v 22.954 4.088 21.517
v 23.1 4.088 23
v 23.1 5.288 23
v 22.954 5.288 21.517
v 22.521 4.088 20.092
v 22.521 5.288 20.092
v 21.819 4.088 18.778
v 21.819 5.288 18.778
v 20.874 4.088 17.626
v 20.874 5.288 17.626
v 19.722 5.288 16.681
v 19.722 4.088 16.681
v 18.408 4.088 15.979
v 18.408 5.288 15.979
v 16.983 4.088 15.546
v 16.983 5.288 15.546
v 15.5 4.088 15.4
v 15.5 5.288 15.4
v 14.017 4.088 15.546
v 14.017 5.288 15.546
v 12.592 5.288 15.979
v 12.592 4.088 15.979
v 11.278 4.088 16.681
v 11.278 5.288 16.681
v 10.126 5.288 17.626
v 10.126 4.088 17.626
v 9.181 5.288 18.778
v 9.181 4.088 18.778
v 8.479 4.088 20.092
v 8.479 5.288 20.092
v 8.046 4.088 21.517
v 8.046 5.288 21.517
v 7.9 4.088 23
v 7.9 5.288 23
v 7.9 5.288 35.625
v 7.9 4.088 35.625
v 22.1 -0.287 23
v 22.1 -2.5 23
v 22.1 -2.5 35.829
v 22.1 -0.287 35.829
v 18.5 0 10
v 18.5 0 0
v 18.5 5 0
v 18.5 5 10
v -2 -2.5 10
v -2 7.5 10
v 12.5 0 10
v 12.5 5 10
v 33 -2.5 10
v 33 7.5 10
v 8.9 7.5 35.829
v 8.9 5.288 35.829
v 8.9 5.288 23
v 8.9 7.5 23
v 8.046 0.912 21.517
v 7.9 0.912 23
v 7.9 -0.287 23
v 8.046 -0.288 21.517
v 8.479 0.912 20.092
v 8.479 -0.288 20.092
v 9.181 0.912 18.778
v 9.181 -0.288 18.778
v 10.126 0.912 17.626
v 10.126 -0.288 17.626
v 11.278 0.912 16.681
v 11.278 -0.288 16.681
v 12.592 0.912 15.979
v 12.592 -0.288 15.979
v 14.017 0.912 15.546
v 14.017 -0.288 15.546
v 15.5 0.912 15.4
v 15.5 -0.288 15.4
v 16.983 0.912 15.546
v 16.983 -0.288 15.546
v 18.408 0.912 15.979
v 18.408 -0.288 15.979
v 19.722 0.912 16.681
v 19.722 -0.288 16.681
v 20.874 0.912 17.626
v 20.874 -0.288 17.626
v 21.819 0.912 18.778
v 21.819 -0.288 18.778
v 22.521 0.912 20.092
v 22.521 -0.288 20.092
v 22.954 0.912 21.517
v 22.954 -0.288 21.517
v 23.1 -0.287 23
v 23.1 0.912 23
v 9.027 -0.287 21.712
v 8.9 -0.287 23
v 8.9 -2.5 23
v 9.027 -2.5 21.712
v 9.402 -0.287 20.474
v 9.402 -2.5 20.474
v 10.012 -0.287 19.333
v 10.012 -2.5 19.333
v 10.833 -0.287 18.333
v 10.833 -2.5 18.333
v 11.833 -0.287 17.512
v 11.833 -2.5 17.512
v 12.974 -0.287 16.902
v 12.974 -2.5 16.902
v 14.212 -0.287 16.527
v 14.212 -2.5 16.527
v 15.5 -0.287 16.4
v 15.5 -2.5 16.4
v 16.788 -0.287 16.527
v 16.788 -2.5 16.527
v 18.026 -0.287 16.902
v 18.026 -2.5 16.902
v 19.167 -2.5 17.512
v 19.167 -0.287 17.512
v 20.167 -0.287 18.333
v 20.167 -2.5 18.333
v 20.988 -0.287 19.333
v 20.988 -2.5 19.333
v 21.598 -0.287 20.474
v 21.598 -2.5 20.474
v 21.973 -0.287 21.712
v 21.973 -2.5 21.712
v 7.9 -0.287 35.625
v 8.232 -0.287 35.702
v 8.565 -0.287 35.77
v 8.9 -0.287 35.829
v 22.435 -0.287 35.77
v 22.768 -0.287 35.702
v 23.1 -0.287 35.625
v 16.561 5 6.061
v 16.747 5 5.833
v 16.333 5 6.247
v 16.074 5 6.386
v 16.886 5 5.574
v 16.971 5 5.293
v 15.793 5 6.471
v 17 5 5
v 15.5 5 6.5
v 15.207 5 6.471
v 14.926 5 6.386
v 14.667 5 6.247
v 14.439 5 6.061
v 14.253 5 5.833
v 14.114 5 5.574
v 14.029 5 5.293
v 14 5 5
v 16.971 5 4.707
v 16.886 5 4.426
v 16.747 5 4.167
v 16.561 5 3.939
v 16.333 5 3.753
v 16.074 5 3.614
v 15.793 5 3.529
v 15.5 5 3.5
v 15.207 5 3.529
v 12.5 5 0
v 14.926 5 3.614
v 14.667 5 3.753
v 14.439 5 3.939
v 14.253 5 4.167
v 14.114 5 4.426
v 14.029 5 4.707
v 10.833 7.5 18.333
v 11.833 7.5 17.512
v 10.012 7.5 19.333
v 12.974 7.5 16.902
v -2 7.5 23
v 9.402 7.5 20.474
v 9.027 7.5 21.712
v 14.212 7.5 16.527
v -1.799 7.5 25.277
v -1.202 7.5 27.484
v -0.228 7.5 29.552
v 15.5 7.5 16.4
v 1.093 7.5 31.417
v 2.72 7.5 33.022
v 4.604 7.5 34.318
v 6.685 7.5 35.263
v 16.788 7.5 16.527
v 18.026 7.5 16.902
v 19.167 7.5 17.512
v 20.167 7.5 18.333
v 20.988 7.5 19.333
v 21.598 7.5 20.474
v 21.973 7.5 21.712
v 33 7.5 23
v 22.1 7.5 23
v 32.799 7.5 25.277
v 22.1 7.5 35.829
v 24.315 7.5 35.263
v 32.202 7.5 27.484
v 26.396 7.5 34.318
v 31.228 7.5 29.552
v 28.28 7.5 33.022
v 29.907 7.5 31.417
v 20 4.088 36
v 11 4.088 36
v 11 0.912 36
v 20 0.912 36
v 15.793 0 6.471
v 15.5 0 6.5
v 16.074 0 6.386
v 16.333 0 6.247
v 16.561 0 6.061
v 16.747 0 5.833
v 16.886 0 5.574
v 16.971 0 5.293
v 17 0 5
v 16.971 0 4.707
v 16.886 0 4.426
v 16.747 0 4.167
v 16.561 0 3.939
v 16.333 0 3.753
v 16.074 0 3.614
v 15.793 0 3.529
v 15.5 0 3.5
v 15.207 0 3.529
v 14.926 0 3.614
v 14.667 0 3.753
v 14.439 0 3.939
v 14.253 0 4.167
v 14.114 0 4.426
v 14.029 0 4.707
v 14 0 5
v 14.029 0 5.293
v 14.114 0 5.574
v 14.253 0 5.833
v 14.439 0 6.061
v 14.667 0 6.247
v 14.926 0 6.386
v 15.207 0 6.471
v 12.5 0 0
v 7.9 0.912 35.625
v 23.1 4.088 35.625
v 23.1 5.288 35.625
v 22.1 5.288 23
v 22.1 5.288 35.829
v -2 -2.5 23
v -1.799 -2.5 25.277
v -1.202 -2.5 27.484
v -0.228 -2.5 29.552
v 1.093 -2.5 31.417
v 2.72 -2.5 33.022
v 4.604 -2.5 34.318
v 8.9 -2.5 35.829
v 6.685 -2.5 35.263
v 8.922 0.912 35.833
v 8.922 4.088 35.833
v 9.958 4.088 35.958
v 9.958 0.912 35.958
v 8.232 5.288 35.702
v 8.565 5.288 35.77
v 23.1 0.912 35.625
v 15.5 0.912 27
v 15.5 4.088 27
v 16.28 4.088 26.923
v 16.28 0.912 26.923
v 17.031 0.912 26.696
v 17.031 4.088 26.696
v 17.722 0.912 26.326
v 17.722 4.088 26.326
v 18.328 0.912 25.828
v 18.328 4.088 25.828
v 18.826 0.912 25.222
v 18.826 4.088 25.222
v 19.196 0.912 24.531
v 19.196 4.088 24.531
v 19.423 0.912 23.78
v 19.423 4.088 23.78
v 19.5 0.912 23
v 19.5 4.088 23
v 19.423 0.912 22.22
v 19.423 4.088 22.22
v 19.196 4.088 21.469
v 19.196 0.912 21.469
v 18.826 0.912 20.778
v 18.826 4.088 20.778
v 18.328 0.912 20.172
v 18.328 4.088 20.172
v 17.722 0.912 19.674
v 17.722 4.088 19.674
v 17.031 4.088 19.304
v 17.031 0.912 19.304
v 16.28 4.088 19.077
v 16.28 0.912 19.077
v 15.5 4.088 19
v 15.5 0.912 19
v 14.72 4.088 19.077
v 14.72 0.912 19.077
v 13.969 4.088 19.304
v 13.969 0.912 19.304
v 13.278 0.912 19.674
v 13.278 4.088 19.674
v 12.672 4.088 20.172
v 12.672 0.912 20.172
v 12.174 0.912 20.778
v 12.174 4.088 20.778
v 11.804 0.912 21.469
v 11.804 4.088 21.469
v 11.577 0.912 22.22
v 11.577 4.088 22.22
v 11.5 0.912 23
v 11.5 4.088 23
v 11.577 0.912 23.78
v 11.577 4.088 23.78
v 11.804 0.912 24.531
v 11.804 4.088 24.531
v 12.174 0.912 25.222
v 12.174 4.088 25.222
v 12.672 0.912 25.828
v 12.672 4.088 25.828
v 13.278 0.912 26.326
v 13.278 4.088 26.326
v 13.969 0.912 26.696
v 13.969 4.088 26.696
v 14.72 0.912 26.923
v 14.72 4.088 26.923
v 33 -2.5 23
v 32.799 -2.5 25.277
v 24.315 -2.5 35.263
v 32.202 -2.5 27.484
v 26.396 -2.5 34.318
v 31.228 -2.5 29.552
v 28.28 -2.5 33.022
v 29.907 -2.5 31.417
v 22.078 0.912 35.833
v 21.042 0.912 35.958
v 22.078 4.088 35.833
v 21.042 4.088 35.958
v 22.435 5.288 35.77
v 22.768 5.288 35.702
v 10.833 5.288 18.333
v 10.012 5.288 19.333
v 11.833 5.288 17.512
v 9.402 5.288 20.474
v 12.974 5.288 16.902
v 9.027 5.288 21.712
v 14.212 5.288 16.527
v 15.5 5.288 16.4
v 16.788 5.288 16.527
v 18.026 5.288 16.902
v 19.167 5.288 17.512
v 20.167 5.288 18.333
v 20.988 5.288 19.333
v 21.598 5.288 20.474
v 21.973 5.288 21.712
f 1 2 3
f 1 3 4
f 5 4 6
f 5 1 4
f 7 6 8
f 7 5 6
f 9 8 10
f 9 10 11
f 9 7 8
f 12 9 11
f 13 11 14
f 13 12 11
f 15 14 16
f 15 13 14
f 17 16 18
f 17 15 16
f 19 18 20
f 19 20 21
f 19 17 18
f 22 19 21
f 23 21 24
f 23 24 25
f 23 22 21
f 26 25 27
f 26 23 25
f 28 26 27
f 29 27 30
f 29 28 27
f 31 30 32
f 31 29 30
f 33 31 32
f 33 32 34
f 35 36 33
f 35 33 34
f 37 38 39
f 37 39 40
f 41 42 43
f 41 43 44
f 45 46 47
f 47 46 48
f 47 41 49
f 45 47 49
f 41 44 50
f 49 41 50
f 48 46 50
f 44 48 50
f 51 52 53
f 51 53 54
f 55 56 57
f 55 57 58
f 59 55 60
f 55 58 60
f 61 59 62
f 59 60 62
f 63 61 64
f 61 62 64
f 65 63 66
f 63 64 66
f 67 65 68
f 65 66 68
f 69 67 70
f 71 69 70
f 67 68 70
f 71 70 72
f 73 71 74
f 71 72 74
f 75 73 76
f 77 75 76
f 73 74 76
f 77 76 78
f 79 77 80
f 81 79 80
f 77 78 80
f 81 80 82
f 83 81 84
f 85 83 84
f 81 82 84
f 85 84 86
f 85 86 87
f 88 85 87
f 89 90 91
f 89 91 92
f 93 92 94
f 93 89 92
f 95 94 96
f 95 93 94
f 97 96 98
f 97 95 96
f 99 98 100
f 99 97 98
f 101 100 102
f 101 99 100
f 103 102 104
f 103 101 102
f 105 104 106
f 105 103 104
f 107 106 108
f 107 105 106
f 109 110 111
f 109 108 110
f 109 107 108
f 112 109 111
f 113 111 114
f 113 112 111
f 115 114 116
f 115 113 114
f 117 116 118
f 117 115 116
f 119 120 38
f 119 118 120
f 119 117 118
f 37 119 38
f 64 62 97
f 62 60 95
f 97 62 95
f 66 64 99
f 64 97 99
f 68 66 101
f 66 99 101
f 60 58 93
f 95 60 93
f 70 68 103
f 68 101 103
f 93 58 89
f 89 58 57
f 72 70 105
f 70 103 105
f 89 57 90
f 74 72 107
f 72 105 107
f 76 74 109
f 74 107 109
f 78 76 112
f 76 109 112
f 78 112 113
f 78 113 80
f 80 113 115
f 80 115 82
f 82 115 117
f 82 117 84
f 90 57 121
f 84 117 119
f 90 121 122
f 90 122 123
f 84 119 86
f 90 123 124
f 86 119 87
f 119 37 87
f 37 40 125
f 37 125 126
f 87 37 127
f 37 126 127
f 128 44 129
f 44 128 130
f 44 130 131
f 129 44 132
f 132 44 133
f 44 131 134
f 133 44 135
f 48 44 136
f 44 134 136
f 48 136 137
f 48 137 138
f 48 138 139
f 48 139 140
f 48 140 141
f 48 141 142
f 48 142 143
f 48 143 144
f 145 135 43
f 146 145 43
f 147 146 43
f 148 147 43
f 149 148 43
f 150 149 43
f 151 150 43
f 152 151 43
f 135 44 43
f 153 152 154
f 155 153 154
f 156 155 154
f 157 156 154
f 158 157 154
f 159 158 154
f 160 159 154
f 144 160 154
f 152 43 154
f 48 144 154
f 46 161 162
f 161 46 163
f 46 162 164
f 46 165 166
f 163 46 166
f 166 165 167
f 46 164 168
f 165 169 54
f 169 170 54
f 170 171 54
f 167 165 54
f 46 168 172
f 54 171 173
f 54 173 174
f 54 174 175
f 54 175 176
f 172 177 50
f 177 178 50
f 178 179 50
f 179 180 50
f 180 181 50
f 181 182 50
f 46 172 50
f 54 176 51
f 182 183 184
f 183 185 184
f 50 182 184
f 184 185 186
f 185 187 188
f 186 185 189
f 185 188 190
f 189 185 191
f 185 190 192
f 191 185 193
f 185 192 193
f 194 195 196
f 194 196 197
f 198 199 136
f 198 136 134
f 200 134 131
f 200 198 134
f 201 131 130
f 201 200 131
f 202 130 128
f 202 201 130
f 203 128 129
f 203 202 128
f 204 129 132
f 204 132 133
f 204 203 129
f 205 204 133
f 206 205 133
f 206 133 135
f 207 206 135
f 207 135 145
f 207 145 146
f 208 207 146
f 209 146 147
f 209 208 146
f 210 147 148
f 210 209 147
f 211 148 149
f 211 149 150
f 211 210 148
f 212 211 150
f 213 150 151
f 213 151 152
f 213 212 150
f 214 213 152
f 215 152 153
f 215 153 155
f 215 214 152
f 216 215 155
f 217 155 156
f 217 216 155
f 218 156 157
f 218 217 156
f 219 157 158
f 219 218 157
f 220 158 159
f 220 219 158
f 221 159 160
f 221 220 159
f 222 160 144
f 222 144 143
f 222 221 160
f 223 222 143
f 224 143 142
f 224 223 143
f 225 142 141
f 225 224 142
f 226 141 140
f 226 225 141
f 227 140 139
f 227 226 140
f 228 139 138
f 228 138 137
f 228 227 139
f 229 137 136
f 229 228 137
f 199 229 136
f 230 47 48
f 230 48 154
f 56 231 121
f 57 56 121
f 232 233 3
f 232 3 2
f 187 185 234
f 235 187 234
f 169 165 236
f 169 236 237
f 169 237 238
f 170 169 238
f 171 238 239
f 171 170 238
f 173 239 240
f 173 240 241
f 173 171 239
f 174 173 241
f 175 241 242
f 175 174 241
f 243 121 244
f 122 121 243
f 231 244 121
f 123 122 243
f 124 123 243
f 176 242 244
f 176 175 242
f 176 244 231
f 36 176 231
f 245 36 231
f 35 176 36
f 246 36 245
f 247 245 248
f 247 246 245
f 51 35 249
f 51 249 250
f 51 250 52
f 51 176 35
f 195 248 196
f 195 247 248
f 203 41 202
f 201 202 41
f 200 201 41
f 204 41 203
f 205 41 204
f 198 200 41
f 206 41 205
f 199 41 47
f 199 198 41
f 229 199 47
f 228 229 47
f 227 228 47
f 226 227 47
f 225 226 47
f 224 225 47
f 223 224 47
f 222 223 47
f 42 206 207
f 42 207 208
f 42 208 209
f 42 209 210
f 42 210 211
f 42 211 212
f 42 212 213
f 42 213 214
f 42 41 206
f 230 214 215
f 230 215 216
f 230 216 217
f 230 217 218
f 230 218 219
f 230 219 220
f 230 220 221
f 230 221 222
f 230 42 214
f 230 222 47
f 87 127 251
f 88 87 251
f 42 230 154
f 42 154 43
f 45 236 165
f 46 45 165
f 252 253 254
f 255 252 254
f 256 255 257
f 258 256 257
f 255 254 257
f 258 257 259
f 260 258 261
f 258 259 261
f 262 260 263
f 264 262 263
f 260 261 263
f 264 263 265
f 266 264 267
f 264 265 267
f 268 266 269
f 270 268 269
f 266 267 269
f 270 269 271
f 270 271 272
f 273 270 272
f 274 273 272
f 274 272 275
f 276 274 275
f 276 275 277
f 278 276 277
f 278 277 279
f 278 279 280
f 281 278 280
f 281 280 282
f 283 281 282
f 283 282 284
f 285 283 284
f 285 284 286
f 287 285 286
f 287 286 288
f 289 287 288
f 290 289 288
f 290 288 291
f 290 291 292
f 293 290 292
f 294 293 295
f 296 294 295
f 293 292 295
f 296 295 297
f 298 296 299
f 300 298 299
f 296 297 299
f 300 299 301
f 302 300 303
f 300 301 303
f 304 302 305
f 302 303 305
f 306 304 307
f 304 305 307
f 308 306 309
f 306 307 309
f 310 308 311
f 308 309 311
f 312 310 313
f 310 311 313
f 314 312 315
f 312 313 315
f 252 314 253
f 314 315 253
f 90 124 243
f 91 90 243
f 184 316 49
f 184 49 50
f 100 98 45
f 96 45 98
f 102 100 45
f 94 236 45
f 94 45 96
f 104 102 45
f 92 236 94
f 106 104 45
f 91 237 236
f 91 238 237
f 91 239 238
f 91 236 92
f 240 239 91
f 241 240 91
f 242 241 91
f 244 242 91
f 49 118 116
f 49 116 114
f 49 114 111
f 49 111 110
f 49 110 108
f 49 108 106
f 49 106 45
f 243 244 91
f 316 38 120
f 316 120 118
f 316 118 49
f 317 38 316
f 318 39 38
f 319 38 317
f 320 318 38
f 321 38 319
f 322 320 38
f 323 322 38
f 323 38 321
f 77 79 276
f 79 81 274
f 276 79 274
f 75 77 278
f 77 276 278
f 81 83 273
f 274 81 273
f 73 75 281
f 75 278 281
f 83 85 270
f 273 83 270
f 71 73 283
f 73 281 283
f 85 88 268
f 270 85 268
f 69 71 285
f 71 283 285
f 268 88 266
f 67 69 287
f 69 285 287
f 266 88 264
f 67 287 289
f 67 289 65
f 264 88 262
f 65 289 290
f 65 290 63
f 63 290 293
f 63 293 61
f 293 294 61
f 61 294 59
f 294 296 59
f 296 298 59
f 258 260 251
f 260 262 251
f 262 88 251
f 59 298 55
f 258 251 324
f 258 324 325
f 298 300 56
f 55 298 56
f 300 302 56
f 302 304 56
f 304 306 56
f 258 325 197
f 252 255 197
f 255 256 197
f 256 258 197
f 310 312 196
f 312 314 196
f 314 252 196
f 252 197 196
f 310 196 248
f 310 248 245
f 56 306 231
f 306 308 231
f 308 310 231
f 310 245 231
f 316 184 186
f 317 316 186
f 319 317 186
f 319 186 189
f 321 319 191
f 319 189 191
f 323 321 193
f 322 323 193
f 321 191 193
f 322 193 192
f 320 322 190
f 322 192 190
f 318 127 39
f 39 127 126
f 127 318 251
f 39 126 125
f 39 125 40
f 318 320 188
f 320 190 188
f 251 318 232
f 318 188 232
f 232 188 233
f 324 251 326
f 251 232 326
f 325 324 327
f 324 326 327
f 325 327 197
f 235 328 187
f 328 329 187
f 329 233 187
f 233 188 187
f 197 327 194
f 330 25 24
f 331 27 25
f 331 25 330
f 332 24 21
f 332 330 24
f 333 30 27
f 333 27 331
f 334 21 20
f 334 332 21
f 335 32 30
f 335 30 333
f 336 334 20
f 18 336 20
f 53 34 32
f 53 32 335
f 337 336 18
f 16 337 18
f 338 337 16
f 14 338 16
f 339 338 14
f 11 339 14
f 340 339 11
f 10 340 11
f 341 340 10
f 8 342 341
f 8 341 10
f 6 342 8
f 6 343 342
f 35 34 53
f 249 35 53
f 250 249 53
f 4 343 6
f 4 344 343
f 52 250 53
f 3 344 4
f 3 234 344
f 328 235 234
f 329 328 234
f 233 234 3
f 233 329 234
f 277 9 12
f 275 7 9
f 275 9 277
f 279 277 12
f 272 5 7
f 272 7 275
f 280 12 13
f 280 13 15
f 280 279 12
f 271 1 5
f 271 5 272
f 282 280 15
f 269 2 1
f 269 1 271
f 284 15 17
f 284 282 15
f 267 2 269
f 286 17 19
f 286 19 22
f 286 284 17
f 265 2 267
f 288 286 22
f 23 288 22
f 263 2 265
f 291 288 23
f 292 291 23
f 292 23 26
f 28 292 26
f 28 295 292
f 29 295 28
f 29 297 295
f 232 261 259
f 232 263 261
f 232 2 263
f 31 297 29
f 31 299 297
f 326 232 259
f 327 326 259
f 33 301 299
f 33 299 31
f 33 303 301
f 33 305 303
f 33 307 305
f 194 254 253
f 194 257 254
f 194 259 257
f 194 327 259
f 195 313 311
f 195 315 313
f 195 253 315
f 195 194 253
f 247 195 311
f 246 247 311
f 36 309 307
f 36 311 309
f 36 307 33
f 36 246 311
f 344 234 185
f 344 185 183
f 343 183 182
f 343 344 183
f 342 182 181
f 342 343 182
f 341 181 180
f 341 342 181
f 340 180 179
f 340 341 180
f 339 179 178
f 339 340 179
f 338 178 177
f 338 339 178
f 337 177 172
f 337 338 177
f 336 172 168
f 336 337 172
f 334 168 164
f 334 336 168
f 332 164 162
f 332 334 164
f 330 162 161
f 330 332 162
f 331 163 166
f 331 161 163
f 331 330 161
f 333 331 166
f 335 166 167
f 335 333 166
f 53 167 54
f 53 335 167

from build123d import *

# Parameters (mm, degrees)
SKETCH1_R           = 1.5
BOSS_EXTRUDE1_DEPTH = 5
SKETCH2_W           = 35
SKETCH2_H           = 2.5
BOSS_EXTRUDE2_DEPTH = 26
FILLET1_R           = 13
CUT_EXTRUDE1_DEPTH  = 13
SKETCH4_R           = 7.6
CUT_EXTRUDE2_DEPTH  = 1.2
SKETCH5_R           = 6.6
CUT_EXTRUDE3_DEPTH  = 50.27874954
CUT_EXTRUDE4_START  = 1.2
SKETCH6_R           = 7.6
CUT_EXTRUDE4_DEPTH  = 1.2
SKETCH7_R           = 6.6
CUT_EXTRUDE5_DEPTH  = 50.27874954
SKETCH8_R           = 4
CUT_EXTRUDE6_DEPTH  = 50.27874954


with BuildPart() as part:
    # Sketch1 → Boss-Extrude1 (new body)
    with BuildSketch(Plane(origin=(0, 0, 0), x_dir=(1, 0, 0), z_dir=(0, 1, 0))):
        Polygon((6, -10), (12.5, -10), (12.5, 0), (18.5, 0), (18.5, -10), (25, -10), (31, -10), (33, -10), (33, -36), (-2, -36), (-2, -10), (0, -10), align=None)
        with Locations(Location((15.5, -5, 0), (0, 0, 270))):
            Circle(SKETCH1_R, mode=Mode.SUBTRACT)
    extrude(amount=BOSS_EXTRUDE1_DEPTH)

    # Sketch2 → Boss-Extrude2 (add)
    with BuildSketch(Plane.XY.offset(36)):
        with Locations((15.5, 6.25)):
            Rectangle(SKETCH2_W, SKETCH2_H)
        with Locations((15.5, -1.25)):
            Rectangle(SKETCH2_W, SKETCH2_H)
    extrude(amount=-BOSS_EXTRUDE2_DEPTH)

    # Fillet1
    fillet1_edges = [part.edges().sort_by_distance(p)[0] for p in [
        (33, 2.5, 36),
        (-2, 2.5, 36),
    ]]
    fillet(fillet1_edges, radius=FILLET1_R)

    # Sketch3 → Cut-Extrude1 (cut)
    with BuildSketch(Plane(origin=(0, 0, 36), x_dir=(-1, 0, 0), z_dir=(0, 0, -1))):
        Polygon((-22.1, 7.5), (-22.1, 5.2875), (-23.1, 5.2875), (-23.1, 4.0875), (-15.5, 4.0875), (-7.9, 4.0875), (-7.9, 5.2875), (-8.9, 5.2875), (-8.9, 7.5), align=None)
    cut_extrude1 = extrude(amount=CUT_EXTRUDE1_DEPTH, mode=Mode.SUBTRACT)

    # Sketch4 → Cut-Extrude2 (cut)
    with BuildSketch(Plane(origin=(0, 4.0875, 0), x_dir=(1, 0, 0), z_dir=(0, 1, 0))):
        with Locations((15.5, -23)):
            Circle(SKETCH4_R)
    extrude(amount=CUT_EXTRUDE2_DEPTH, mode=Mode.SUBTRACT)

    # Sketch5 → Cut-Extrude3 (cut, through all)
    with BuildSketch(Plane(origin=(0, 4.0875, 0), x_dir=(1, 0, 0), z_dir=(0, 1, 0))):
        with Locations((15.5, -23)):
            Circle(SKETCH5_R)
    extrude(amount=CUT_EXTRUDE3_DEPTH, mode=Mode.SUBTRACT)

    # Mirror1: Cut-Extrude1 across plane
    add(cut_extrude1.mirror(Plane(origin=(0, 2.5, 0), x_dir=(0, 0, 1), z_dir=(0, -1, 0))), mode=Mode.SUBTRACT)

    # Sketch6 → Cut-Extrude4 (cut)
    with BuildSketch(Plane.XZ.offset(-0.9125).offset(CUT_EXTRUDE4_START)):
        with Locations((15.5, 23)):
            Circle(SKETCH6_R)
    extrude(amount=-CUT_EXTRUDE4_DEPTH, mode=Mode.SUBTRACT)

    # Sketch7 → Cut-Extrude5 (cut, through all)
    with BuildSketch(Plane.XZ.offset(-0.9125)):
        with Locations((15.5, 23)):
            Circle(SKETCH7_R)
    extrude(amount=CUT_EXTRUDE5_DEPTH, mode=Mode.SUBTRACT)

    # Sketch8 → Cut-Extrude6 (cut, through all)
    with BuildSketch(Plane(origin=(0, 4.0875, 0), x_dir=(1, 0, 0), z_dir=(0, 1, 0))):
        with Locations(Location((15.5, -23, 0), (0, 0, 270))):
            Circle(SKETCH8_R)
    extrude(amount=-CUT_EXTRUDE6_DEPTH, mode=Mode.SUBTRACT)


solid = part.part
